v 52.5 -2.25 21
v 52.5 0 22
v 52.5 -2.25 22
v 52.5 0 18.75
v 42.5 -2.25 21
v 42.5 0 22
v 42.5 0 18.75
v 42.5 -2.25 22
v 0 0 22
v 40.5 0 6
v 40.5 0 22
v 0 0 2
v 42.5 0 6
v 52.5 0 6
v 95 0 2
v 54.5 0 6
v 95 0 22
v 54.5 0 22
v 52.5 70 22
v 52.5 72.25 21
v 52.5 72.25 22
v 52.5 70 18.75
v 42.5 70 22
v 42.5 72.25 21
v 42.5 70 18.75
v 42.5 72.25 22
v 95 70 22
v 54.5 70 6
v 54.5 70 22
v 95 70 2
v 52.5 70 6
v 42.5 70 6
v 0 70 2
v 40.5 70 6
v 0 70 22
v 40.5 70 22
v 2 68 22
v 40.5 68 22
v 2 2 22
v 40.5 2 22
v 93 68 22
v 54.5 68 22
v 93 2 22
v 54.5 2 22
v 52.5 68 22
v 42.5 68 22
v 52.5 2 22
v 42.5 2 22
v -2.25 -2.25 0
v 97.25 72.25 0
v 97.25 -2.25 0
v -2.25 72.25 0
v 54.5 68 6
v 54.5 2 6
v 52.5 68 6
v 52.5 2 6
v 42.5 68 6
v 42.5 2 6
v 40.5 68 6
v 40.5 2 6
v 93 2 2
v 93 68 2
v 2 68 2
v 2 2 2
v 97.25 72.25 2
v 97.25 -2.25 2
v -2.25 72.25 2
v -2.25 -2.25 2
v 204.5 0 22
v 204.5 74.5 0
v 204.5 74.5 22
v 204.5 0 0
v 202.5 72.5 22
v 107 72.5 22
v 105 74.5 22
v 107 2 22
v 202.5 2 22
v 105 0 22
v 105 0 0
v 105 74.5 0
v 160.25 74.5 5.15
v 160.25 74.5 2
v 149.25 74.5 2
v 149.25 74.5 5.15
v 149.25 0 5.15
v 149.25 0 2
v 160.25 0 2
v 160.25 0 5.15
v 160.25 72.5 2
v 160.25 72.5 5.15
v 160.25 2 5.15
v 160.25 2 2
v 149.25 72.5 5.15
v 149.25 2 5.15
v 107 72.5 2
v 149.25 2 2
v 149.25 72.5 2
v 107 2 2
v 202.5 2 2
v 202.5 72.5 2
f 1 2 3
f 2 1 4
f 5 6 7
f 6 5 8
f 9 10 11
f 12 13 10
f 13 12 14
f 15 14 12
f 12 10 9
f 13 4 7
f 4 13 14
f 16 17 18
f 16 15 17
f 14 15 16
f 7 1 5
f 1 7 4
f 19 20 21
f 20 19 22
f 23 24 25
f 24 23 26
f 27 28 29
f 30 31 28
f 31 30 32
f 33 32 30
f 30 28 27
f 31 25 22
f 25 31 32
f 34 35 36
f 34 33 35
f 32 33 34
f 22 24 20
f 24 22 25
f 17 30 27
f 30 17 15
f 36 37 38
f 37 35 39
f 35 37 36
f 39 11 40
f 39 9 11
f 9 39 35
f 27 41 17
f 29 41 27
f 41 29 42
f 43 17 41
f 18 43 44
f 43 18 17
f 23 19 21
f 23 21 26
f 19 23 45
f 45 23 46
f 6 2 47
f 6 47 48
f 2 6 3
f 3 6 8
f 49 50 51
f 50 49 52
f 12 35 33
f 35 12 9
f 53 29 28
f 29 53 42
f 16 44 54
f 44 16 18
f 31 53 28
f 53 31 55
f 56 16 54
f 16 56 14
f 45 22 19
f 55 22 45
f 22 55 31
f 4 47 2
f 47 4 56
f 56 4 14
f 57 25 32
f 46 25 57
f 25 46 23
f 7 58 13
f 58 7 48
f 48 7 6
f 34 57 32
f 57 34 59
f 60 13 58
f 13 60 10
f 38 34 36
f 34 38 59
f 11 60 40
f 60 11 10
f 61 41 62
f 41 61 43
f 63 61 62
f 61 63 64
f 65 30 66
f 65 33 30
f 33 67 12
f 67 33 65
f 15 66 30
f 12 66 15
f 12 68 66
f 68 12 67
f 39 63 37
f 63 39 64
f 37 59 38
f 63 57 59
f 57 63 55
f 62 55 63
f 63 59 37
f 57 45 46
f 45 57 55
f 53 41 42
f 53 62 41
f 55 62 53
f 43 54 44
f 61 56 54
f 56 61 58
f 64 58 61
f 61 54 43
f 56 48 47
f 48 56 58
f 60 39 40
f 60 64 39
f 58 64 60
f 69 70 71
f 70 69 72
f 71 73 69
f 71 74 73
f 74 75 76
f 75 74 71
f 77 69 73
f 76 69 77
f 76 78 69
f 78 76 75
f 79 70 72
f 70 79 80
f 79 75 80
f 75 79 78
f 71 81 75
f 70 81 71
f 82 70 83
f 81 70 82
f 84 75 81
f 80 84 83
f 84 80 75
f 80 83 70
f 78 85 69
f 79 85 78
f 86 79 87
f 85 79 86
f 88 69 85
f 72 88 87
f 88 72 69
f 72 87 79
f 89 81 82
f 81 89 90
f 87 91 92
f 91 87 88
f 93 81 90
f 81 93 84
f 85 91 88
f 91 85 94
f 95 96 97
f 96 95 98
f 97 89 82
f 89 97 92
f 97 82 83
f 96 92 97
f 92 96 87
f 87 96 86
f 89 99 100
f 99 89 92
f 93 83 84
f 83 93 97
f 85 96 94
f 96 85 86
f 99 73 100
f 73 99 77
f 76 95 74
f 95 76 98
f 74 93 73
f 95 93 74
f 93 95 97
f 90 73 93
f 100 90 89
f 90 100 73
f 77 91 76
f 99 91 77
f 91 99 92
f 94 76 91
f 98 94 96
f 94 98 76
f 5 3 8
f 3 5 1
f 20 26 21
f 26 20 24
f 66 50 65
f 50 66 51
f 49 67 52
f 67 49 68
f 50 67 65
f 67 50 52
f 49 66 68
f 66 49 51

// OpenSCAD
// [FL_INDEX: keywords="openscad, 3d_parametric, Parametric_Card_Box, csg_solid" | COT="Parametric OpenSCAD design from 3DCodeverse"]
// Title: Parametric Card Box

CARD_SIZE_LONG_EDGE =91;
CARD_SIZE_SHORT_EDGE = 66;
CARD_STACK_HEIGHT = 20;
WALL_THICKNESS = 2;
TAB_THICKNESS = 10;
EXTRA_SPACE = .25;


CARD_LONG_EDGE = CARD_SIZE_LONG_EDGE + (WALL_THICKNESS*2);
CARD_SHORT_EDGE = CARD_SIZE_SHORT_EDGE + (WALL_THICKNESS*2);
ALL_EXTRA_SPACE = (EXTRA_SPACE *2);

LID_OUTSIDE_LONG_THICKNESS = CARD_LONG_EDGE + (WALL_THICKNESS*2);
LID_OUTSIDE_SHORT_THICKNESS = CARD_SHORT_EDGE + (WALL_THICKNESS*2);

SPACE_BETWEEN_BOTTOM_AND_LID = LID_OUTSIDE_LONG_THICKNESS + (WALL_THICKNESS*2)+ 2;

HEIGHT = CARD_STACK_HEIGHT + WALL_THICKNESS;

	//*Start Bottom of Box

					//*Start wedge 1
translate ([((CARD_LONG_EDGE/2) -(TAB_THICKNESS/2)),-WALL_THICKNESS-EXTRA_SPACE,HEIGHT-WALL_THICKNESS-1-EXTRA_SPACE]) 

difference (){
cube ([TAB_THICKNESS,WALL_THICKNESS+EXTRA_SPACE,WALL_THICKNESS+EXTRA_SPACE]);
translate ([0, WALL_THICKNESS+(EXTRA_SPACE),0]) rotate ([135,0,0])  

cube ([(TAB_THICKNESS+3), sqrt(((WALL_THICKNESS+EXTRA_SPACE)*(WALL_THICKNESS+EXTRA_SPACE))+((WALL_THICKNESS+EXTRA_SPACE)*(WALL_THICKNESS+EXTRA_SPACE))), sqrt(((WALL_THICKNESS+EXTRA_SPACE)*(WALL_THICKNESS+EXTRA_SPACE))+((WALL_THICKNESS+EXTRA_SPACE)*(WALL_THICKNESS+EXTRA_SPACE)))]);

}
			//*end wedge 1


			//*Start wedge 2
translate ([((CARD_LONG_EDGE/2) - (TAB_THICKNESS/2)),CARD_SHORT_EDGE,HEIGHT-WALL_THICKNESS-1-EXTRA_SPACE])

 difference (){
cube ([TAB_THICKNESS,WALL_THICKNESS+EXTRA_SPACE,WALL_THICKNESS+EXTRA_SPACE]);

translate ([0 ,0 ,0]) rotate ([-45,0,0])  cube ([(TAB_THICKNESS+3),sqrt(((WALL_THICKNESS+EXTRA_SPACE)*(WALL_THICKNESS+EXTRA_SPACE))+((WALL_THICKNESS+EXTRA_SPACE)*(WALL_THICKNESS+EXTRA_SPACE))),sqrt(((WALL_THICKNESS+EXTRA_SPACE)*(WALL_THICKNESS+EXTRA_SPACE))+((WALL_THICKNESS+EXTRA_SPACE)*(WALL_THICKNESS+EXTRA_SPACE)))]);
}
			//*end wedge 2


translate ([((CARD_LONG_EDGE/2) -(TAB_THICKNESS/2)),-WALL_THICKNESS-EXTRA_SPACE,HEIGHT-1])  cube ([TAB_THICKNESS, WALL_THICKNESS+EXTRA_SPACE, 1]); 					//*Tab

translate ([((CARD_LONG_EDGE/2) -(TAB_THICKNESS/2)),CARD_SHORT_EDGE,HEIGHT-1])  cube ([TAB_THICKNESS, WALL_THICKNESS+EXTRA_SPACE, 1]);				//*Tab

translate ([-WALL_THICKNESS-EXTRA_SPACE, -WALL_THICKNESS-EXTRA_SPACE, 0 ]) cube ([CARD_LONG_EDGE + (WALL_THICKNESS*2)+ALL_EXTRA_SPACE, CARD_SHORT_EDGE + (WALL_THICKNESS*2)+ALL_EXTRA_SPACE, WALL_THICKNESS]);  						//*Bottom Plate

difference() 
{
	cube ([CARD_LONG_EDGE,CARD_SHORT_EDGE,HEIGHT]);		//*Main Body

	translate([ ((CARD_LONG_EDGE / 2) + (TAB_THICKNESS/2)), -.5, ((HEIGHT+ WALL_THICKNESS) / 4) ]) cube ([2, CARD_SHORT_EDGE + 2, HEIGHT]);	//*Tab cutout
	
	translate([ ((CARD_LONG_EDGE / 2) - ((TAB_THICKNESS/2)+2)), -.5, ((HEIGHT+ WALL_THICKNESS)/ 4) ]) cube ([2, CARD_SHORT_EDGE + 2, HEIGHT ]);  //*Tab cutout

	translate([WALL_THICKNESS,WALL_THICKNESS,WALL_THICKNESS]) cube ([CARD_LONG_EDGE - (WALL_THICKNESS*2),CARD_SHORT_EDGE - (WALL_THICKNESS*2),HEIGHT]);			//*Hole
}

			//*End Bottom of Box



			//*Start Top of Box


translate ([SPACE_BETWEEN_BOTTOM_AND_LID, 0, 0]) 


difference() 
{
	cube ([LID_OUTSIDE_LONG_THICKNESS+ALL_EXTRA_SPACE, LID_OUTSIDE_SHORT_THICKNESS+ALL_EXTRA_SPACE, HEIGHT]); 		//*Top Main Body


	translate([ ((LID_OUTSIDE_LONG_THICKNESS+ALL_EXTRA_SPACE) / 2)-((TAB_THICKNESS+1)/2), -.5, WALL_THICKNESS]) 
cube ([(TAB_THICKNESS+1), LID_OUTSIDE_SHORT_THICKNESS + 2, WALL_THICKNESS+1.15 ]); 	//*Tab Hole

	translate([WALL_THICKNESS,WALL_THICKNESS, WALL_THICKNESS]) 
cube ([LID_OUTSIDE_LONG_THICKNESS - (WALL_THICKNESS*2)+ALL_EXTRA_SPACE,LID_OUTSIDE_SHORT_THICKNESS - (WALL_THICKNESS*2)+ALL_EXTRA_SPACE,HEIGHT]);		//*Hole
}

			//* End Top of Box
